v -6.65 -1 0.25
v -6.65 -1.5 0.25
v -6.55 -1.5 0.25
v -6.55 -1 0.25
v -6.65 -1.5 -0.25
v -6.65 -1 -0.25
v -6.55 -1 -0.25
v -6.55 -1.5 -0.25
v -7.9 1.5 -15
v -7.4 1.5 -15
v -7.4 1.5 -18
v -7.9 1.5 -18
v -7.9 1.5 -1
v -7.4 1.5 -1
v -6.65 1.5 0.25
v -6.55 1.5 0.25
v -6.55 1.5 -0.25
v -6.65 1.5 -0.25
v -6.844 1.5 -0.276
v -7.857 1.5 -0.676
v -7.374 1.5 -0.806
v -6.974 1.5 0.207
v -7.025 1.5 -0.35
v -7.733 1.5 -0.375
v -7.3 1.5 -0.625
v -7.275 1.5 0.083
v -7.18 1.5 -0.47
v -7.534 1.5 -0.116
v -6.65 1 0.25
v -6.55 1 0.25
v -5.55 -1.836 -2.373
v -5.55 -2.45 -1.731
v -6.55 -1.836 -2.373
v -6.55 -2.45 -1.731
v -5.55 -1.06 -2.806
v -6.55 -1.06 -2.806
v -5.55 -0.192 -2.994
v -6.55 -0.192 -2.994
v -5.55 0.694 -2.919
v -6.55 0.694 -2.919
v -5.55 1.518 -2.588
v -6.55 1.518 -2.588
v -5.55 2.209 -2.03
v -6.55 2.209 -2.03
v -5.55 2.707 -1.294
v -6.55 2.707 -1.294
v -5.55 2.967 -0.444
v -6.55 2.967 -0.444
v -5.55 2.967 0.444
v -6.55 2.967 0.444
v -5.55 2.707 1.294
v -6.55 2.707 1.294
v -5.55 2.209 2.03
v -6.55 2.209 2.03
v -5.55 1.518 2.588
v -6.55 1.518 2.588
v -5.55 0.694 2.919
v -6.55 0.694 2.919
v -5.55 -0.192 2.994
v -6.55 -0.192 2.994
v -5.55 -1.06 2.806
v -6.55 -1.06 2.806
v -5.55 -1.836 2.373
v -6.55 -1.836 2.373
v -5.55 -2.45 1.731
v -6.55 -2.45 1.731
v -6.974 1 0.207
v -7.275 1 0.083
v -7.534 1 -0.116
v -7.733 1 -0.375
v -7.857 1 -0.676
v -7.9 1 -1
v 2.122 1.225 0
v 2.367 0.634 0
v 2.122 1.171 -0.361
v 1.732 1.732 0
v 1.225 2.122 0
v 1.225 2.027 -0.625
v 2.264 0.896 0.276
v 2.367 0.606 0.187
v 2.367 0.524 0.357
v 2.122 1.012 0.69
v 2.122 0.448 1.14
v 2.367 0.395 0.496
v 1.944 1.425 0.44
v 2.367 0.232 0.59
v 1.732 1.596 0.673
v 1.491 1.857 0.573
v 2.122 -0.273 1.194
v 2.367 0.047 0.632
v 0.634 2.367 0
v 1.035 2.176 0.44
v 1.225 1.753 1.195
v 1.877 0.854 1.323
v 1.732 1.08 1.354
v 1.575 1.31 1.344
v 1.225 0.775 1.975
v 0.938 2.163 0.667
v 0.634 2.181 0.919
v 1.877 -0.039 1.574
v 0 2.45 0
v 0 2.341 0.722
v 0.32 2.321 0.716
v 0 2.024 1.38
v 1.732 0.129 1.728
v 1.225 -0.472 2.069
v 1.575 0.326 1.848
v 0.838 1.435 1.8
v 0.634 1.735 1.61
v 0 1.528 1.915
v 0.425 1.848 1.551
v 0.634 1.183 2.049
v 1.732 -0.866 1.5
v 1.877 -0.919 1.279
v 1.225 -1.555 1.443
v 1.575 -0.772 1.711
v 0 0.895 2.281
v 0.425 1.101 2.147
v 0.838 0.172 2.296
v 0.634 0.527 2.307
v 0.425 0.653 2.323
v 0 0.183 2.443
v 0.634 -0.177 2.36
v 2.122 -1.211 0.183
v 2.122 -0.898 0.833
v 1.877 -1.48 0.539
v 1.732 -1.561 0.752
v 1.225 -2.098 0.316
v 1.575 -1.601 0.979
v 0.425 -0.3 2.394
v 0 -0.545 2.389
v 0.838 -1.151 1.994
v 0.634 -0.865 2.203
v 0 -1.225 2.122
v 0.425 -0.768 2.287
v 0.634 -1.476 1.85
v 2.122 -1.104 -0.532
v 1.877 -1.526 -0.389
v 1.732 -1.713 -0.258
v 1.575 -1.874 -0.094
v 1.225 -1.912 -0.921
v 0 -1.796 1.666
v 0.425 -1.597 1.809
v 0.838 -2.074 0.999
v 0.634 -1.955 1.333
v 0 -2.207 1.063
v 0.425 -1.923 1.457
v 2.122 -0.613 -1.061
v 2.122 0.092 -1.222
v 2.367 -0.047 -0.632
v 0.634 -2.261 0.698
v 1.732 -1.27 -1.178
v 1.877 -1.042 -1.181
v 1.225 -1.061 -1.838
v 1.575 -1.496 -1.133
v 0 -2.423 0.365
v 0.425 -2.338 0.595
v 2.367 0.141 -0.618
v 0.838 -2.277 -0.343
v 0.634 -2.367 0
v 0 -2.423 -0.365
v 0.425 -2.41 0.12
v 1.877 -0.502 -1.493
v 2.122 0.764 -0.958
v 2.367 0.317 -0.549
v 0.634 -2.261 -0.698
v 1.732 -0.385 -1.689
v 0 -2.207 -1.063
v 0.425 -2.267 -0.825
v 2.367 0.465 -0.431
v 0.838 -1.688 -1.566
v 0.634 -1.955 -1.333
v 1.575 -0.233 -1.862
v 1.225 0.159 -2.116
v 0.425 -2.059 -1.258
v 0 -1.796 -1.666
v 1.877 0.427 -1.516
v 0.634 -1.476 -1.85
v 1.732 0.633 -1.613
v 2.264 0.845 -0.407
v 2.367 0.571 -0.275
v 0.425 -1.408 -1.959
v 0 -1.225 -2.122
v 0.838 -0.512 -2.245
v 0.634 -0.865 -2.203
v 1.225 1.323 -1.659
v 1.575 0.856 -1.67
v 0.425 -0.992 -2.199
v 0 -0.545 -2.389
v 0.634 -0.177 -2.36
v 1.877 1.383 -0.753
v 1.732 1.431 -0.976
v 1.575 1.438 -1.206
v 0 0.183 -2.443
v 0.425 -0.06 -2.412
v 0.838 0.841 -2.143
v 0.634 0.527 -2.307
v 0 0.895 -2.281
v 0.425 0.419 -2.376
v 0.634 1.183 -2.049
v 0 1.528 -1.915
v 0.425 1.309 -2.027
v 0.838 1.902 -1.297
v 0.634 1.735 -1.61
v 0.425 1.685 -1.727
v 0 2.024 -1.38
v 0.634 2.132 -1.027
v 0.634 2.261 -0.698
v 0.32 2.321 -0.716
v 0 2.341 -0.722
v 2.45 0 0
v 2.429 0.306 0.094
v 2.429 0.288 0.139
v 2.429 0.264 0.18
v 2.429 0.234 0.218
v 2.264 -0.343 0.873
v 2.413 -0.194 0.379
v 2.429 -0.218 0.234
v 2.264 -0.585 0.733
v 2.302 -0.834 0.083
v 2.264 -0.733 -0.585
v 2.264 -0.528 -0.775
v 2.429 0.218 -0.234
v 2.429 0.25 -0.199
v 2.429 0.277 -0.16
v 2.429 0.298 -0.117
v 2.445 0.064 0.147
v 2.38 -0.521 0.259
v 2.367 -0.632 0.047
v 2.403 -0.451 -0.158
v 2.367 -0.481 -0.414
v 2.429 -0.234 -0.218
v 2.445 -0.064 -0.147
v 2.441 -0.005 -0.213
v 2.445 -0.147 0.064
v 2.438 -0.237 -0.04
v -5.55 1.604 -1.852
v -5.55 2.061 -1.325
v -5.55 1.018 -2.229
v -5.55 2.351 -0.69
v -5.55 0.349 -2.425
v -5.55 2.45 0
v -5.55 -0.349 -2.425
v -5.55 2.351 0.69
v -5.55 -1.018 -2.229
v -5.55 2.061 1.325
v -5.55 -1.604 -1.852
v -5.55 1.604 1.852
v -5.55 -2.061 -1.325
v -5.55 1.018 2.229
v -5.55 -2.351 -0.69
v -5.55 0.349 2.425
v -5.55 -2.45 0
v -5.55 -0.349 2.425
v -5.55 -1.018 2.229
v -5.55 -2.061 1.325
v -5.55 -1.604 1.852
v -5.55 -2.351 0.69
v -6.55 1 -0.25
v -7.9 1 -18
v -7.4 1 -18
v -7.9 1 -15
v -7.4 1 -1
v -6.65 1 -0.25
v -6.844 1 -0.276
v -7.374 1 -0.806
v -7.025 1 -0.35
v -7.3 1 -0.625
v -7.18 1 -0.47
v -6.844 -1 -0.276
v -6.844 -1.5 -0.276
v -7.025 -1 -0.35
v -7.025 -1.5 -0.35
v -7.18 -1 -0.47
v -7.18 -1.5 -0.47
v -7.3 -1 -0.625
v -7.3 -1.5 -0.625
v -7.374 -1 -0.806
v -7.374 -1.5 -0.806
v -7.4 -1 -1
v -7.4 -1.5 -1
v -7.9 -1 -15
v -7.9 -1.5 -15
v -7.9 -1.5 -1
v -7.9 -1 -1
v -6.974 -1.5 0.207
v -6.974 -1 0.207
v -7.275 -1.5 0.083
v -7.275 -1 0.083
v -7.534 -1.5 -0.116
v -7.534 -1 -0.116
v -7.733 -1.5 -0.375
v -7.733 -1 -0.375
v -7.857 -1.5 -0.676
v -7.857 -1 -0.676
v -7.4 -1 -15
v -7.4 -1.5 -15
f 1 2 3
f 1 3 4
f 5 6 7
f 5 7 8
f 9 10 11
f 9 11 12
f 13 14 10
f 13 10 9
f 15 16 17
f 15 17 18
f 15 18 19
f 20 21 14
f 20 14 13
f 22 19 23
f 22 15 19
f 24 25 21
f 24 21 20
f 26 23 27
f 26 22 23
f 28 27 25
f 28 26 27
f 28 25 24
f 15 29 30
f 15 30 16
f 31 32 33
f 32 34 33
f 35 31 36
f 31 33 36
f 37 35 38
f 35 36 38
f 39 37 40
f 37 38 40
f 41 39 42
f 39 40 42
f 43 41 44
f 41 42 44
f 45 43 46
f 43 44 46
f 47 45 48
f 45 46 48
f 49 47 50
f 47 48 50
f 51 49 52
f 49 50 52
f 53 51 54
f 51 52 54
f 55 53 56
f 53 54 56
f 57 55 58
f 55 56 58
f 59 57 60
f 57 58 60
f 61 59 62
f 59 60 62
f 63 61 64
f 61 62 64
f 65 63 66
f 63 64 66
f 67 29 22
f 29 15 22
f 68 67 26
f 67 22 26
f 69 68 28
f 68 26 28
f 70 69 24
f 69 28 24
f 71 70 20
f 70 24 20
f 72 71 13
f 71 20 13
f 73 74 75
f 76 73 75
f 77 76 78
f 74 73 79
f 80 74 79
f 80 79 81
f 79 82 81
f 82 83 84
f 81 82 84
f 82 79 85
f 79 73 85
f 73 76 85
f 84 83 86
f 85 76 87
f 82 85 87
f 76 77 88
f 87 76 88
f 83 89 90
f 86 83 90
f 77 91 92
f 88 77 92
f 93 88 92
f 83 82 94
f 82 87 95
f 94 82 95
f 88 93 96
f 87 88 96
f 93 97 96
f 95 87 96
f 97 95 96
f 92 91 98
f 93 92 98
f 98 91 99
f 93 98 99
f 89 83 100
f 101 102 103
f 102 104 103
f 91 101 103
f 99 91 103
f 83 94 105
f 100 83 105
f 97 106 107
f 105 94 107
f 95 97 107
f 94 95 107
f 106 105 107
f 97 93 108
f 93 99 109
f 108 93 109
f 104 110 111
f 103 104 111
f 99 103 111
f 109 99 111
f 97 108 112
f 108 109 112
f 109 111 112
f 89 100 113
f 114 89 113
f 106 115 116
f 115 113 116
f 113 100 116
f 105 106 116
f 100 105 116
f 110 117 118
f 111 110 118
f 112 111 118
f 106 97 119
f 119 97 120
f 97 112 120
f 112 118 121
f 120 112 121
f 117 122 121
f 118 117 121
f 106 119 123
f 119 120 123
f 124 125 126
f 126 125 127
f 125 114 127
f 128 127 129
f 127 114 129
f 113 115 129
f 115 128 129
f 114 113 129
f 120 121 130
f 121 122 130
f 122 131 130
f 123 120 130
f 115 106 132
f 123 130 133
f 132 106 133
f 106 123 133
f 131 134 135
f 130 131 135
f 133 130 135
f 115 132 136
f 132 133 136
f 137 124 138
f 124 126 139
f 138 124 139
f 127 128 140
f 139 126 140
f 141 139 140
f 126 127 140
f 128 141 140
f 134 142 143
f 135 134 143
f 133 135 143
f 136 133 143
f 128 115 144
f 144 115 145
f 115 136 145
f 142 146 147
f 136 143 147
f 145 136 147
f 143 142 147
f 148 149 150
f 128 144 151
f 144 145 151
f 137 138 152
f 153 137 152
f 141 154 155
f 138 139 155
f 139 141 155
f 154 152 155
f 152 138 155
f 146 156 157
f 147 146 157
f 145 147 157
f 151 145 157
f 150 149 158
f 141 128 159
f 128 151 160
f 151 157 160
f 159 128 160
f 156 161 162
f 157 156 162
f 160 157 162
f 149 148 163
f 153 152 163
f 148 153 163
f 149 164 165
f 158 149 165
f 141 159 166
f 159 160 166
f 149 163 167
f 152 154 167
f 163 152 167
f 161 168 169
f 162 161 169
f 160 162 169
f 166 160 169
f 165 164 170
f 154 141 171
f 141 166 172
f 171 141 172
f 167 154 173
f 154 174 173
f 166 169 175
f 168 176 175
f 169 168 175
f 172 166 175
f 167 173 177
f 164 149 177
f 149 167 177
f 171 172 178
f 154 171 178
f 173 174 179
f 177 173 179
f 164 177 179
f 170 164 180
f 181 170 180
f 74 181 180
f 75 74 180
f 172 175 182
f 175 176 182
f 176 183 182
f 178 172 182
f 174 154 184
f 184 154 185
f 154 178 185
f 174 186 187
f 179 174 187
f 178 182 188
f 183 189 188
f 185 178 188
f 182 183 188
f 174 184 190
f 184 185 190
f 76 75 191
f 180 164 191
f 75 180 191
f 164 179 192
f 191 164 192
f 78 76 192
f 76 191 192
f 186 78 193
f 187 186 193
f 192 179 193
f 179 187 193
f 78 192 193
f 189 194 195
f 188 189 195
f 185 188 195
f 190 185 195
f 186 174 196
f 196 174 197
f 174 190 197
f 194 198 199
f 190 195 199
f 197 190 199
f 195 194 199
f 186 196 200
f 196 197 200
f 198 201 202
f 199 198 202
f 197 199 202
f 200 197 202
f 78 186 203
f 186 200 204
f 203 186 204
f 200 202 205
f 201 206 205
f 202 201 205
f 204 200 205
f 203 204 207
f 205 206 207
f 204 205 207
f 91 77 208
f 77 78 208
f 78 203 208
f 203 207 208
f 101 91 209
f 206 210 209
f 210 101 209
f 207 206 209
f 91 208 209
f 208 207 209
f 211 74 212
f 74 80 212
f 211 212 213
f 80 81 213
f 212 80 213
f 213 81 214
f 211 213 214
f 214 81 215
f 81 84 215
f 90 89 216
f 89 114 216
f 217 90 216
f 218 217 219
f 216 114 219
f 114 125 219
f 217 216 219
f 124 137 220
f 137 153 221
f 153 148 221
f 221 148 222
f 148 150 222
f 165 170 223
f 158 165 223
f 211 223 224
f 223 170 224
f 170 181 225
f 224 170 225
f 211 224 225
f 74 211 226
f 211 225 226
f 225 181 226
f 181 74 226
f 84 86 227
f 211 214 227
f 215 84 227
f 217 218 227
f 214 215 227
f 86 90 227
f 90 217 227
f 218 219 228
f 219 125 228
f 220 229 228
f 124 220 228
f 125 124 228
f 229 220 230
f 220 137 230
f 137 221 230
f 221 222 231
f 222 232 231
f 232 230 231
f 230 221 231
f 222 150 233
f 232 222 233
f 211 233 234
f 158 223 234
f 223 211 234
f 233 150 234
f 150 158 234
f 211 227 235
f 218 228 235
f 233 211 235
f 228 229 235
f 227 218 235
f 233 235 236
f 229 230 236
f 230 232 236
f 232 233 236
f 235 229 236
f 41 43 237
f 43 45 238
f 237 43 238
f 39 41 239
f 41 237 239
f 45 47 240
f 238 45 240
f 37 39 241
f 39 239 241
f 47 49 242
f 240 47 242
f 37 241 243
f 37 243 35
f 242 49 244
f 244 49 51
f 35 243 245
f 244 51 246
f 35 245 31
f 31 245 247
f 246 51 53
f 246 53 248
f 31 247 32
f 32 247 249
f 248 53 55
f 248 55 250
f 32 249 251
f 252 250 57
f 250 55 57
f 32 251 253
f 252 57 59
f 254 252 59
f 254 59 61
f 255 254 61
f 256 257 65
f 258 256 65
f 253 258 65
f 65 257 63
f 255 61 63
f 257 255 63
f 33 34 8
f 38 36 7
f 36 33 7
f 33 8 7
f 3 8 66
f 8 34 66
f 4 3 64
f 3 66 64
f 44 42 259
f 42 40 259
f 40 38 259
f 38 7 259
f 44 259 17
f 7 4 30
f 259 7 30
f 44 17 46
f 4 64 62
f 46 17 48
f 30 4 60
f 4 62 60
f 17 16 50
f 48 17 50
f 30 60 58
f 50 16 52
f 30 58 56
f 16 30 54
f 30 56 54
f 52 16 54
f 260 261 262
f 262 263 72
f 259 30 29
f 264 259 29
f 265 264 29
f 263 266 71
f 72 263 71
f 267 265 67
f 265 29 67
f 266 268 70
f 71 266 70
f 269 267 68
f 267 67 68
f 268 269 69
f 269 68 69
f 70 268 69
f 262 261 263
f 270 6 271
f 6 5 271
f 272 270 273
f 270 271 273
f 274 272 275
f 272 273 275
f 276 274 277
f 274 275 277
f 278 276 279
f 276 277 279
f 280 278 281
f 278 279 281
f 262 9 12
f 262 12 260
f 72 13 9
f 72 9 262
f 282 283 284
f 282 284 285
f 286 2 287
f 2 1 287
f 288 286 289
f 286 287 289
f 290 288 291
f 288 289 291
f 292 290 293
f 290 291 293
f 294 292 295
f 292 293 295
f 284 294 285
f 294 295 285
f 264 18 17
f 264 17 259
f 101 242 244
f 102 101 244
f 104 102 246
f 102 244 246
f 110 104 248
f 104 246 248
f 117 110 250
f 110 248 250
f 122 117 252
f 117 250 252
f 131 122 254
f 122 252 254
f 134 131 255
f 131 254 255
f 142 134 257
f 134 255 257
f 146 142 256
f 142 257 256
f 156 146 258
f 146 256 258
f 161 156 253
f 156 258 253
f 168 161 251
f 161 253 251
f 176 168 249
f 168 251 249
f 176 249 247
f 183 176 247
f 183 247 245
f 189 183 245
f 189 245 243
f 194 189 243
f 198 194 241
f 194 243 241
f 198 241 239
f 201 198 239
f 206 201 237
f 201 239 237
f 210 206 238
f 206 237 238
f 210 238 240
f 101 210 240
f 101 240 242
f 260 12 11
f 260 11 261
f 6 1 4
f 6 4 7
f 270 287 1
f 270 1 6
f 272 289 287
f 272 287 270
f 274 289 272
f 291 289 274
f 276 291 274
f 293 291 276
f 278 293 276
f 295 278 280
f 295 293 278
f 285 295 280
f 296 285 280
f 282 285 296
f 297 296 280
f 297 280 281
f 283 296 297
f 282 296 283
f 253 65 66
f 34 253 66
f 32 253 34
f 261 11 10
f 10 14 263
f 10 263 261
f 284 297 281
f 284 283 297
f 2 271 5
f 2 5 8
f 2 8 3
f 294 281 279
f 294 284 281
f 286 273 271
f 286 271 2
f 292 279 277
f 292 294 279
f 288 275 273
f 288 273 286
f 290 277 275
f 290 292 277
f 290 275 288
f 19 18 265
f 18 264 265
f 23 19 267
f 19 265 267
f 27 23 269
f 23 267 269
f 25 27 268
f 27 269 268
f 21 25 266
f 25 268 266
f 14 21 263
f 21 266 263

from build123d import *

# Parameters (mm, degrees)
SKETCH005_W              = 0.5
SKETCH005_H              = 0.5
SKETCH006_W              = 0.5
SKETCH006_H              = 0.5
ADDITIVEPIPE001_FACE21_W = 0.5
ADDITIVEPIPE001_FACE21_H = 0.5
PAD001_DEPTH             = 3
POCKET_DEPTH             = 5


with BuildPart() as part:
    # Sketch002 → Revolution (revolve)
    with BuildSketch(Plane.XY):
        with BuildLine():
            Line((0, 2.45), (-5.55, 2.45))
            Line((-5.55, 2.45), (-5.55, 3))
            Line((-5.55, 3), (-6.55, 3))
            Line((-6.55, 3), (-6.55, 0))
            Line((2.45, 0), (-6.55, 0))
            ThreePointArc((2.45, 0), (1.732412, 1.732412), (0, 2.45))
        make_face()
    revolve(axis=Axis((0, 0, 0), (1, 0, 0)))

    # AdditivePipe: sweep along a path in Sketch004
    with BuildLine(Plane.XZ) as additivepipe_path:
        Line((-6.55, 0), (-6.65, 0))
        ThreePointArc((-6.65, 0), (-7.357107, -0.292893), (-7.65, -1))
        Line((-7.65, -1), (-7.65, -15))
    # Sketch005 (on Face4 of Revolution) → AdditivePipe (sweep)
    with BuildSketch(Plane(origin=(-6.55, 0, 0), x_dir=(0, -1, 0), z_dir=(-1, 0, 0))):
        with Locations((1.25, 0)):
            Rectangle(SKETCH005_W, SKETCH005_H)
    sweep(path=additivepipe_path.line)

    # AdditivePipe001: sweep along a path in Sketch004
    with BuildLine(Plane.XZ) as additivepipe001_path:
        Line((-6.55, 0), (-6.65, 0))
        ThreePointArc((-6.65, 0), (-7.357107, -0.292893), (-7.65, -1))
        Line((-7.65, -1), (-7.65, -15))
    # Sketch006 (on Face4 of Revolution) → AdditivePipe001 (sweep)
    with BuildSketch(Plane(origin=(-6.55, 0, 0), x_dir=(0, -1, 0), z_dir=(-1, 0, 0))):
        with Locations((-1.25, 0)):
            Rectangle(SKETCH006_W, SKETCH006_H)
    sweep(path=additivepipe001_path.line)

    # AdditivePipe001 Face21 → Pad001 (new)
    with BuildSketch(Plane(origin=(-7.65, 1.25, -15), x_dir=(0, -1, 0), z_dir=(0, 0, -1))):
        Rectangle(ADDITIVEPIPE001_FACE21_W, ADDITIVEPIPE001_FACE21_H)
    extrude(amount=PAD001_DEPTH)

    # Sketch007 (on Face3 of Pad001) → Pocket (cut)
    with BuildSketch(Plane.YZ.offset(-5.55)):
        with BuildLine():
            Line((-2.45, 1.731329), (-2.45, -1.731329))
            ThreePointArc((-2.45, 1.731329), (-3.000002, 0), (-2.45, -1.731329))
        make_face()
    extrude(amount=-POCKET_DEPTH, mode=Mode.SUBTRACT)


solid = part.part
